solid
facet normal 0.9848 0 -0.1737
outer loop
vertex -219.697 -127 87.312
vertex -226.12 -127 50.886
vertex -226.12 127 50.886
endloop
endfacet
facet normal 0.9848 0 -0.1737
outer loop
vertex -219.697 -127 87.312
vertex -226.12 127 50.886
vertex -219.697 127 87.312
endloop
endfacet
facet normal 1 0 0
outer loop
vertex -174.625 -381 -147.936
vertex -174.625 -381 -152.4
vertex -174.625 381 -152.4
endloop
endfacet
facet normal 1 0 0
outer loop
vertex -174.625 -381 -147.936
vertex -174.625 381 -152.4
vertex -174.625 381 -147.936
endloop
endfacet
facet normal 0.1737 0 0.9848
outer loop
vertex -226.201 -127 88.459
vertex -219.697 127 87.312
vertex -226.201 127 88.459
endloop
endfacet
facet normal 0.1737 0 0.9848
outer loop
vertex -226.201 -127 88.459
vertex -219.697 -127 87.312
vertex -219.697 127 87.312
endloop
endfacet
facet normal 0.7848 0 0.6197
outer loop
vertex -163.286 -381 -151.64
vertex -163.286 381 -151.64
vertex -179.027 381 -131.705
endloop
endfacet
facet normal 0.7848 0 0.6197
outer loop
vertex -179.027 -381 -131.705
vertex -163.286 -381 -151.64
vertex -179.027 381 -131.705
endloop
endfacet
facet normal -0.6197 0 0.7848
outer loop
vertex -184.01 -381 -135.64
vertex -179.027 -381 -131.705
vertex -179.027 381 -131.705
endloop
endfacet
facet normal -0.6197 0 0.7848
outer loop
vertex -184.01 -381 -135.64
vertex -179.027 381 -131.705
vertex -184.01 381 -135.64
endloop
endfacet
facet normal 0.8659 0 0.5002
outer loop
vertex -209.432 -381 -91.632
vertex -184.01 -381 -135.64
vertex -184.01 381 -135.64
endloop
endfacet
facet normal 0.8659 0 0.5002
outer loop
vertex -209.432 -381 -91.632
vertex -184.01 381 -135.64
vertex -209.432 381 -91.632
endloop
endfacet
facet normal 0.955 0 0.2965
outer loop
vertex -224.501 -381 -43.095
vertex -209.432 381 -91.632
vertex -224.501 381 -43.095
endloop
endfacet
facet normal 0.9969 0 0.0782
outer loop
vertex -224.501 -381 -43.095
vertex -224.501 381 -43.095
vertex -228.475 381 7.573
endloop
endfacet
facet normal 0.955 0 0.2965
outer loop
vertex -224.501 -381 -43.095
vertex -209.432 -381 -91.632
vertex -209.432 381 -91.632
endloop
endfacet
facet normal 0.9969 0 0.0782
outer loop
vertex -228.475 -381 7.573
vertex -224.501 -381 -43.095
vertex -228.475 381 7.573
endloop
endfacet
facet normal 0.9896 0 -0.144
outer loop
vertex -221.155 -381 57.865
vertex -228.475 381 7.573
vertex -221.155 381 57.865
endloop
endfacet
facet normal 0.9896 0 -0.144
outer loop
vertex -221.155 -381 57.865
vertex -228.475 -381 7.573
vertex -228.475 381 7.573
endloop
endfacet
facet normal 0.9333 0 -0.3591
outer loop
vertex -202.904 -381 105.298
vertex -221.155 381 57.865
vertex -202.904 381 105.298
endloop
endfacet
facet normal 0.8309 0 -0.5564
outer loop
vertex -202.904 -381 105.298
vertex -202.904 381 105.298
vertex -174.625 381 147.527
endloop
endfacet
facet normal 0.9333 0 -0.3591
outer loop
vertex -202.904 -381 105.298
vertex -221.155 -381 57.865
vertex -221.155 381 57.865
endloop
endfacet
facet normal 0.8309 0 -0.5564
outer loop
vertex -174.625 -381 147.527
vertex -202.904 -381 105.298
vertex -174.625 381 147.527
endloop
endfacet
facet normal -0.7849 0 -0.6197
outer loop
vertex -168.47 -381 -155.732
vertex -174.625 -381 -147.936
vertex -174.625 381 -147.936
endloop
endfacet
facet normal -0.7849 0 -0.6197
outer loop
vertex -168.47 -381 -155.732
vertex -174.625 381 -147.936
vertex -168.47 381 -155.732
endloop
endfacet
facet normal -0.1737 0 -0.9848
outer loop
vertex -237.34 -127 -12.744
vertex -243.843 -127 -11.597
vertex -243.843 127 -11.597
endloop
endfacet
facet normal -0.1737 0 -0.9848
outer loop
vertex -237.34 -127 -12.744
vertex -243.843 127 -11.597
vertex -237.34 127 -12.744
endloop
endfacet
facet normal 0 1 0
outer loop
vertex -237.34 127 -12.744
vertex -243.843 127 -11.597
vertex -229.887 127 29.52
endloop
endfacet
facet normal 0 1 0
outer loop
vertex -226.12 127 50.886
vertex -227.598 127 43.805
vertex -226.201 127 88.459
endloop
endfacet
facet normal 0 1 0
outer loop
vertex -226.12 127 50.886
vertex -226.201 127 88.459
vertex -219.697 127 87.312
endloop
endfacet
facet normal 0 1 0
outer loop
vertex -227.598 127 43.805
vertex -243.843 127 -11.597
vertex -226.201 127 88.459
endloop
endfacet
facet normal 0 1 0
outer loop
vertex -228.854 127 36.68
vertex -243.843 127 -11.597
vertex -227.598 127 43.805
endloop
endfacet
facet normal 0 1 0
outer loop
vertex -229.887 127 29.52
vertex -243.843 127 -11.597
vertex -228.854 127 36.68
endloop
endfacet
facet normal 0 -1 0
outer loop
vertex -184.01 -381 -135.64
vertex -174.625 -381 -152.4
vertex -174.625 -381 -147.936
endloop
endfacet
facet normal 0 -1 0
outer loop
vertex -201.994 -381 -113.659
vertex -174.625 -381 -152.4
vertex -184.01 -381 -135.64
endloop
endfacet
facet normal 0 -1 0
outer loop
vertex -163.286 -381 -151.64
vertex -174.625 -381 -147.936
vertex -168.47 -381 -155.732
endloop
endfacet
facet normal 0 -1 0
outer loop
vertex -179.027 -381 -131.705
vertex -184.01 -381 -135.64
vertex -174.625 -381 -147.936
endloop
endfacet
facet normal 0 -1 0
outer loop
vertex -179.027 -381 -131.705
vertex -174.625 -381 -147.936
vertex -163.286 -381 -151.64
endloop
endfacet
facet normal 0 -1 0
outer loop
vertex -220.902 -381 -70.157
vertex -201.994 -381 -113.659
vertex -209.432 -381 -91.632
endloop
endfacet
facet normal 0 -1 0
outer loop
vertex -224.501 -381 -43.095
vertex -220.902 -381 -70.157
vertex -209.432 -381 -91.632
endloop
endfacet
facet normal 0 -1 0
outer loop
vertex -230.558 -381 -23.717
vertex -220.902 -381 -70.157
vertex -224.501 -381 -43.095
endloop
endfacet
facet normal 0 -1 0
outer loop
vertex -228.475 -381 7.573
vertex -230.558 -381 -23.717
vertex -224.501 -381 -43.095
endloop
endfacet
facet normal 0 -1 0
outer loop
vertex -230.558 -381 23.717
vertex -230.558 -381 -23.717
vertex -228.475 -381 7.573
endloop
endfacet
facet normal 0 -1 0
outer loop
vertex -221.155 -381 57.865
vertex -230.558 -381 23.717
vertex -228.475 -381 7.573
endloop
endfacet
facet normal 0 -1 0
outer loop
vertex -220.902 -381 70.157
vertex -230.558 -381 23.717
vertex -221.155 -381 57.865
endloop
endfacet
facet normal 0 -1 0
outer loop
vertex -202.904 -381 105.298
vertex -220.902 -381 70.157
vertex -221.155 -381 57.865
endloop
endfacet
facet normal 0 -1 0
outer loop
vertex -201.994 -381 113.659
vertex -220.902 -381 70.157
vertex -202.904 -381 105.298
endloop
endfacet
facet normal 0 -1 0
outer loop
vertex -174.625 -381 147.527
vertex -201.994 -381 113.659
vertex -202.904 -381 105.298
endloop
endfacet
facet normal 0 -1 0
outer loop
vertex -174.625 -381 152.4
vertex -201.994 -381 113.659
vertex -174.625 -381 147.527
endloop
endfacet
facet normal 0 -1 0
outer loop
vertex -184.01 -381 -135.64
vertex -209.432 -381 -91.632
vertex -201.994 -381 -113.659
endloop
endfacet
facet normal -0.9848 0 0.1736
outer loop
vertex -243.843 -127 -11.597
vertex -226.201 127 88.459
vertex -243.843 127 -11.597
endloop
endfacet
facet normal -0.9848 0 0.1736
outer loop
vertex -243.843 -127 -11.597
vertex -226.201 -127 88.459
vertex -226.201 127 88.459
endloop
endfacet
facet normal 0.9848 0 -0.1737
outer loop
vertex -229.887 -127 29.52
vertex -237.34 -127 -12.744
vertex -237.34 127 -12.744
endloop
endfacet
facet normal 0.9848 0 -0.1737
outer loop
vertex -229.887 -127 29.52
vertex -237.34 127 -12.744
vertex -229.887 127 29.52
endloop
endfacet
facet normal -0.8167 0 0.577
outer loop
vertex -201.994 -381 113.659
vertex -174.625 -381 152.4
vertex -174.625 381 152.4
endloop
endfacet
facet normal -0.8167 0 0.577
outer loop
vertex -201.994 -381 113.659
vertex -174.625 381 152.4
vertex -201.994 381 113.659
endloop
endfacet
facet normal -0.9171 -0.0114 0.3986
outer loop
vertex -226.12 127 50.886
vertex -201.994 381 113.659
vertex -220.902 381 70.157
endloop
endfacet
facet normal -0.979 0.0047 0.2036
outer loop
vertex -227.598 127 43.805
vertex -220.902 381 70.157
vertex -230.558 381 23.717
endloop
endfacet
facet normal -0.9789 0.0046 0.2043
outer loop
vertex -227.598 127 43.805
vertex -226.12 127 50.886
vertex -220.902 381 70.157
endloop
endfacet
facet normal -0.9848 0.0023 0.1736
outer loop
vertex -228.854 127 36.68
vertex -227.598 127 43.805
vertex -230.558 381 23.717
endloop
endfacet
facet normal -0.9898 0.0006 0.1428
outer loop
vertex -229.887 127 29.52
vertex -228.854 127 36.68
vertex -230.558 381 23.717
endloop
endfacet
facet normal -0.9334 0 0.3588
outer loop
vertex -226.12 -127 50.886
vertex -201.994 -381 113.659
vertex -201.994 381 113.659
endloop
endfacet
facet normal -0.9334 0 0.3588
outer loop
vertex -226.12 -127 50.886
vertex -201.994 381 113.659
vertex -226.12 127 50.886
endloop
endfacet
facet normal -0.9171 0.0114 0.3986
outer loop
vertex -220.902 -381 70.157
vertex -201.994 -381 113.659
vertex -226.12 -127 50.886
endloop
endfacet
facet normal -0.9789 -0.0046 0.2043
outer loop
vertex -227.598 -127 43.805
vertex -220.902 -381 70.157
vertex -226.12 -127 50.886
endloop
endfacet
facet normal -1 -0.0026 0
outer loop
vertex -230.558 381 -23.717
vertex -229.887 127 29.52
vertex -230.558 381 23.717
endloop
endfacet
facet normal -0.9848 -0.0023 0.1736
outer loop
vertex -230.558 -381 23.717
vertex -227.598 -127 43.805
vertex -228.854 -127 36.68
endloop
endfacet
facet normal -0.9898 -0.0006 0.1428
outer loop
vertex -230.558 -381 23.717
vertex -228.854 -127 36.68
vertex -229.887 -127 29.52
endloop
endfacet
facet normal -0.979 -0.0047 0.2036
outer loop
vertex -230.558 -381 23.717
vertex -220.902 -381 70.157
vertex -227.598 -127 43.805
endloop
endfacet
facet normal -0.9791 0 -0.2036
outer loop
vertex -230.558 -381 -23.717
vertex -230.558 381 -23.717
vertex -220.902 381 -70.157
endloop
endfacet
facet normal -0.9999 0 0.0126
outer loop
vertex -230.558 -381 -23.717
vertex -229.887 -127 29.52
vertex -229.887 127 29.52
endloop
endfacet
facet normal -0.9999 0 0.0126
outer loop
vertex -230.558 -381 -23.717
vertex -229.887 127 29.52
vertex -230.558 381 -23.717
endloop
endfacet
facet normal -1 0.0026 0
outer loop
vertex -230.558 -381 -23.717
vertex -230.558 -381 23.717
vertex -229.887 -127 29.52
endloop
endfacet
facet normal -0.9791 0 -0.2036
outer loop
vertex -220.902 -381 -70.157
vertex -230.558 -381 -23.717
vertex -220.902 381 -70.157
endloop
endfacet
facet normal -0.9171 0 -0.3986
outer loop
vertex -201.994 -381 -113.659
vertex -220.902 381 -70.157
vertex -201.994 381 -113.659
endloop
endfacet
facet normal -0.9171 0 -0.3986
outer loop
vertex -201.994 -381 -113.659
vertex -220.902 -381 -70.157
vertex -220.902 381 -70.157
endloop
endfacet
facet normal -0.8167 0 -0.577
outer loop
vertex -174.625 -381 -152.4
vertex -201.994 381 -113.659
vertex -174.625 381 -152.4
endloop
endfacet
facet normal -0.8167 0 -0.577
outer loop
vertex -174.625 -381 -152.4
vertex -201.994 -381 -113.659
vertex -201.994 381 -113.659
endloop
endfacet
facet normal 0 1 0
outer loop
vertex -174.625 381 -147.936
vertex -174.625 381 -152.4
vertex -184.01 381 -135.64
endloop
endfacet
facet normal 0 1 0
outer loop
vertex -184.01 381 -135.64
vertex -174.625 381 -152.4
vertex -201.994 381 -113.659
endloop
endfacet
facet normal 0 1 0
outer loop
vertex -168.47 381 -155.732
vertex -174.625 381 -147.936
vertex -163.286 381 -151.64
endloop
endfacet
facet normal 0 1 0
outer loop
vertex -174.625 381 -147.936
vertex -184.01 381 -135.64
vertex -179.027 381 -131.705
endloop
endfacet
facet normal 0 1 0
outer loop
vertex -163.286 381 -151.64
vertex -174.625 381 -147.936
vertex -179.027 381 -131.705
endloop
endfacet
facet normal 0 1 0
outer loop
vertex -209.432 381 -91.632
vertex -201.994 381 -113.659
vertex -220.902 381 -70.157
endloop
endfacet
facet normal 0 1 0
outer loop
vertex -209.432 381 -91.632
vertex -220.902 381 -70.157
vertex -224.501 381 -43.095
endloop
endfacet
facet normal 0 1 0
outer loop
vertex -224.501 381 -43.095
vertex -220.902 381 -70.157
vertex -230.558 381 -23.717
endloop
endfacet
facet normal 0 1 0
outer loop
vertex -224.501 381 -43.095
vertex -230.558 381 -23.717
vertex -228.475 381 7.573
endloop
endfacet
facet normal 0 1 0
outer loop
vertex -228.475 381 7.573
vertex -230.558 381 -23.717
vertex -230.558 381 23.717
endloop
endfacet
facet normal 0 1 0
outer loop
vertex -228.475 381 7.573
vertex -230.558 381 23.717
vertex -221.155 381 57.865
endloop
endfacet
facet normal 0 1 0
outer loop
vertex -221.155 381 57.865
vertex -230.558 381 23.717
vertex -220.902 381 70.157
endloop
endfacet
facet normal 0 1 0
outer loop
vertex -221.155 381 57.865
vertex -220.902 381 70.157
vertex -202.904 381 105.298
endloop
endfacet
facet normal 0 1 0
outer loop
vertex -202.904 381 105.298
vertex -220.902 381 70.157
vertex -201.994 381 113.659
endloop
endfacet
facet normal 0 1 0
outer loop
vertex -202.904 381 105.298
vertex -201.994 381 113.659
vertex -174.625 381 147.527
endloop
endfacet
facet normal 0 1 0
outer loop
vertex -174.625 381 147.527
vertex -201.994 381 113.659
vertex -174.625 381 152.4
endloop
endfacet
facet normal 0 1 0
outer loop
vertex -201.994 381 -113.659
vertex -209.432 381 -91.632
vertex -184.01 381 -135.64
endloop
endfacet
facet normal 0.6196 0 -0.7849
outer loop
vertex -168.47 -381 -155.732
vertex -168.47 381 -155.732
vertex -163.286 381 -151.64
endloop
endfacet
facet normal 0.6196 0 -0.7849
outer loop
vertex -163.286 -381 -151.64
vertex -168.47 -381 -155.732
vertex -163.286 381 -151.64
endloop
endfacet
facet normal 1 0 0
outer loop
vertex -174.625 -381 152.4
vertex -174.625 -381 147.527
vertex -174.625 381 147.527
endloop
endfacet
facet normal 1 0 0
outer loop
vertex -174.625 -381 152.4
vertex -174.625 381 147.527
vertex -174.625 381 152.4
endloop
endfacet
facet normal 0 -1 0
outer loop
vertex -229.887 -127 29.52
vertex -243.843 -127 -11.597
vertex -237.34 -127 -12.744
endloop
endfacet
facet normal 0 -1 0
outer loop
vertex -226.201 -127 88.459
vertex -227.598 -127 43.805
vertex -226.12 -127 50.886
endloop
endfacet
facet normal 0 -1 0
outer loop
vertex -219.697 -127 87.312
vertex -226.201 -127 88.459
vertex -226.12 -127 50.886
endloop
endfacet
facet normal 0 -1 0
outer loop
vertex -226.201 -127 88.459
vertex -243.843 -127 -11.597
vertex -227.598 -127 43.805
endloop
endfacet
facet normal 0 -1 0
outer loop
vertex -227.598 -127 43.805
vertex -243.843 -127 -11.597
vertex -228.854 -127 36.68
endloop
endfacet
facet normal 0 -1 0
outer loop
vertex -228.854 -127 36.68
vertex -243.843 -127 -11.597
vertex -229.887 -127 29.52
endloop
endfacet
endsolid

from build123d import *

# Parameters (mm, degrees)
F1_DEPTH = 381
F3_DEPTH = 127
F5_DEPTH = 381


with BuildPart() as f1:
    # F0 (on Front) → F1 (new body, symmetric)
    with BuildSketch(Plane.XZ):
        with BuildLine():
            ThreePointArc((-174.625, -147.526504), (-228.6, 0), (-174.625, 147.526504))
            Line((-174.625, 147.526504), (-174.625, 152.4))
            ThreePointArc((-174.625, 152.4), (-231.775, 0), (-174.625, -152.4))
            Line((-174.625, -152.4), (-174.625, -147.526504))
        make_face()
    extrude(amount=F1_DEPTH, both=True)

    # F2 (on Front) → F3 (join, symmetric)
    with BuildSketch(Plane.XZ):
        Polygon((-226.20073, 88.459134), (-243.843385, -11.597334), (-237.339714, -12.744107), (-219.69706, 87.312361), align=None)
    extrude(amount=F3_DEPTH, both=True)

    # F4 (on Front) → F5 (join, symmetric)
    with BuildSketch(Plane.XZ):
        Polygon((-168.469529, -155.732401), (-163.286397, -151.639974), (-179.026501, -131.704851), (-184.209633, -135.797278), align=None)
    extrude(amount=F5_DEPTH, both=True)


solid = f1.part
